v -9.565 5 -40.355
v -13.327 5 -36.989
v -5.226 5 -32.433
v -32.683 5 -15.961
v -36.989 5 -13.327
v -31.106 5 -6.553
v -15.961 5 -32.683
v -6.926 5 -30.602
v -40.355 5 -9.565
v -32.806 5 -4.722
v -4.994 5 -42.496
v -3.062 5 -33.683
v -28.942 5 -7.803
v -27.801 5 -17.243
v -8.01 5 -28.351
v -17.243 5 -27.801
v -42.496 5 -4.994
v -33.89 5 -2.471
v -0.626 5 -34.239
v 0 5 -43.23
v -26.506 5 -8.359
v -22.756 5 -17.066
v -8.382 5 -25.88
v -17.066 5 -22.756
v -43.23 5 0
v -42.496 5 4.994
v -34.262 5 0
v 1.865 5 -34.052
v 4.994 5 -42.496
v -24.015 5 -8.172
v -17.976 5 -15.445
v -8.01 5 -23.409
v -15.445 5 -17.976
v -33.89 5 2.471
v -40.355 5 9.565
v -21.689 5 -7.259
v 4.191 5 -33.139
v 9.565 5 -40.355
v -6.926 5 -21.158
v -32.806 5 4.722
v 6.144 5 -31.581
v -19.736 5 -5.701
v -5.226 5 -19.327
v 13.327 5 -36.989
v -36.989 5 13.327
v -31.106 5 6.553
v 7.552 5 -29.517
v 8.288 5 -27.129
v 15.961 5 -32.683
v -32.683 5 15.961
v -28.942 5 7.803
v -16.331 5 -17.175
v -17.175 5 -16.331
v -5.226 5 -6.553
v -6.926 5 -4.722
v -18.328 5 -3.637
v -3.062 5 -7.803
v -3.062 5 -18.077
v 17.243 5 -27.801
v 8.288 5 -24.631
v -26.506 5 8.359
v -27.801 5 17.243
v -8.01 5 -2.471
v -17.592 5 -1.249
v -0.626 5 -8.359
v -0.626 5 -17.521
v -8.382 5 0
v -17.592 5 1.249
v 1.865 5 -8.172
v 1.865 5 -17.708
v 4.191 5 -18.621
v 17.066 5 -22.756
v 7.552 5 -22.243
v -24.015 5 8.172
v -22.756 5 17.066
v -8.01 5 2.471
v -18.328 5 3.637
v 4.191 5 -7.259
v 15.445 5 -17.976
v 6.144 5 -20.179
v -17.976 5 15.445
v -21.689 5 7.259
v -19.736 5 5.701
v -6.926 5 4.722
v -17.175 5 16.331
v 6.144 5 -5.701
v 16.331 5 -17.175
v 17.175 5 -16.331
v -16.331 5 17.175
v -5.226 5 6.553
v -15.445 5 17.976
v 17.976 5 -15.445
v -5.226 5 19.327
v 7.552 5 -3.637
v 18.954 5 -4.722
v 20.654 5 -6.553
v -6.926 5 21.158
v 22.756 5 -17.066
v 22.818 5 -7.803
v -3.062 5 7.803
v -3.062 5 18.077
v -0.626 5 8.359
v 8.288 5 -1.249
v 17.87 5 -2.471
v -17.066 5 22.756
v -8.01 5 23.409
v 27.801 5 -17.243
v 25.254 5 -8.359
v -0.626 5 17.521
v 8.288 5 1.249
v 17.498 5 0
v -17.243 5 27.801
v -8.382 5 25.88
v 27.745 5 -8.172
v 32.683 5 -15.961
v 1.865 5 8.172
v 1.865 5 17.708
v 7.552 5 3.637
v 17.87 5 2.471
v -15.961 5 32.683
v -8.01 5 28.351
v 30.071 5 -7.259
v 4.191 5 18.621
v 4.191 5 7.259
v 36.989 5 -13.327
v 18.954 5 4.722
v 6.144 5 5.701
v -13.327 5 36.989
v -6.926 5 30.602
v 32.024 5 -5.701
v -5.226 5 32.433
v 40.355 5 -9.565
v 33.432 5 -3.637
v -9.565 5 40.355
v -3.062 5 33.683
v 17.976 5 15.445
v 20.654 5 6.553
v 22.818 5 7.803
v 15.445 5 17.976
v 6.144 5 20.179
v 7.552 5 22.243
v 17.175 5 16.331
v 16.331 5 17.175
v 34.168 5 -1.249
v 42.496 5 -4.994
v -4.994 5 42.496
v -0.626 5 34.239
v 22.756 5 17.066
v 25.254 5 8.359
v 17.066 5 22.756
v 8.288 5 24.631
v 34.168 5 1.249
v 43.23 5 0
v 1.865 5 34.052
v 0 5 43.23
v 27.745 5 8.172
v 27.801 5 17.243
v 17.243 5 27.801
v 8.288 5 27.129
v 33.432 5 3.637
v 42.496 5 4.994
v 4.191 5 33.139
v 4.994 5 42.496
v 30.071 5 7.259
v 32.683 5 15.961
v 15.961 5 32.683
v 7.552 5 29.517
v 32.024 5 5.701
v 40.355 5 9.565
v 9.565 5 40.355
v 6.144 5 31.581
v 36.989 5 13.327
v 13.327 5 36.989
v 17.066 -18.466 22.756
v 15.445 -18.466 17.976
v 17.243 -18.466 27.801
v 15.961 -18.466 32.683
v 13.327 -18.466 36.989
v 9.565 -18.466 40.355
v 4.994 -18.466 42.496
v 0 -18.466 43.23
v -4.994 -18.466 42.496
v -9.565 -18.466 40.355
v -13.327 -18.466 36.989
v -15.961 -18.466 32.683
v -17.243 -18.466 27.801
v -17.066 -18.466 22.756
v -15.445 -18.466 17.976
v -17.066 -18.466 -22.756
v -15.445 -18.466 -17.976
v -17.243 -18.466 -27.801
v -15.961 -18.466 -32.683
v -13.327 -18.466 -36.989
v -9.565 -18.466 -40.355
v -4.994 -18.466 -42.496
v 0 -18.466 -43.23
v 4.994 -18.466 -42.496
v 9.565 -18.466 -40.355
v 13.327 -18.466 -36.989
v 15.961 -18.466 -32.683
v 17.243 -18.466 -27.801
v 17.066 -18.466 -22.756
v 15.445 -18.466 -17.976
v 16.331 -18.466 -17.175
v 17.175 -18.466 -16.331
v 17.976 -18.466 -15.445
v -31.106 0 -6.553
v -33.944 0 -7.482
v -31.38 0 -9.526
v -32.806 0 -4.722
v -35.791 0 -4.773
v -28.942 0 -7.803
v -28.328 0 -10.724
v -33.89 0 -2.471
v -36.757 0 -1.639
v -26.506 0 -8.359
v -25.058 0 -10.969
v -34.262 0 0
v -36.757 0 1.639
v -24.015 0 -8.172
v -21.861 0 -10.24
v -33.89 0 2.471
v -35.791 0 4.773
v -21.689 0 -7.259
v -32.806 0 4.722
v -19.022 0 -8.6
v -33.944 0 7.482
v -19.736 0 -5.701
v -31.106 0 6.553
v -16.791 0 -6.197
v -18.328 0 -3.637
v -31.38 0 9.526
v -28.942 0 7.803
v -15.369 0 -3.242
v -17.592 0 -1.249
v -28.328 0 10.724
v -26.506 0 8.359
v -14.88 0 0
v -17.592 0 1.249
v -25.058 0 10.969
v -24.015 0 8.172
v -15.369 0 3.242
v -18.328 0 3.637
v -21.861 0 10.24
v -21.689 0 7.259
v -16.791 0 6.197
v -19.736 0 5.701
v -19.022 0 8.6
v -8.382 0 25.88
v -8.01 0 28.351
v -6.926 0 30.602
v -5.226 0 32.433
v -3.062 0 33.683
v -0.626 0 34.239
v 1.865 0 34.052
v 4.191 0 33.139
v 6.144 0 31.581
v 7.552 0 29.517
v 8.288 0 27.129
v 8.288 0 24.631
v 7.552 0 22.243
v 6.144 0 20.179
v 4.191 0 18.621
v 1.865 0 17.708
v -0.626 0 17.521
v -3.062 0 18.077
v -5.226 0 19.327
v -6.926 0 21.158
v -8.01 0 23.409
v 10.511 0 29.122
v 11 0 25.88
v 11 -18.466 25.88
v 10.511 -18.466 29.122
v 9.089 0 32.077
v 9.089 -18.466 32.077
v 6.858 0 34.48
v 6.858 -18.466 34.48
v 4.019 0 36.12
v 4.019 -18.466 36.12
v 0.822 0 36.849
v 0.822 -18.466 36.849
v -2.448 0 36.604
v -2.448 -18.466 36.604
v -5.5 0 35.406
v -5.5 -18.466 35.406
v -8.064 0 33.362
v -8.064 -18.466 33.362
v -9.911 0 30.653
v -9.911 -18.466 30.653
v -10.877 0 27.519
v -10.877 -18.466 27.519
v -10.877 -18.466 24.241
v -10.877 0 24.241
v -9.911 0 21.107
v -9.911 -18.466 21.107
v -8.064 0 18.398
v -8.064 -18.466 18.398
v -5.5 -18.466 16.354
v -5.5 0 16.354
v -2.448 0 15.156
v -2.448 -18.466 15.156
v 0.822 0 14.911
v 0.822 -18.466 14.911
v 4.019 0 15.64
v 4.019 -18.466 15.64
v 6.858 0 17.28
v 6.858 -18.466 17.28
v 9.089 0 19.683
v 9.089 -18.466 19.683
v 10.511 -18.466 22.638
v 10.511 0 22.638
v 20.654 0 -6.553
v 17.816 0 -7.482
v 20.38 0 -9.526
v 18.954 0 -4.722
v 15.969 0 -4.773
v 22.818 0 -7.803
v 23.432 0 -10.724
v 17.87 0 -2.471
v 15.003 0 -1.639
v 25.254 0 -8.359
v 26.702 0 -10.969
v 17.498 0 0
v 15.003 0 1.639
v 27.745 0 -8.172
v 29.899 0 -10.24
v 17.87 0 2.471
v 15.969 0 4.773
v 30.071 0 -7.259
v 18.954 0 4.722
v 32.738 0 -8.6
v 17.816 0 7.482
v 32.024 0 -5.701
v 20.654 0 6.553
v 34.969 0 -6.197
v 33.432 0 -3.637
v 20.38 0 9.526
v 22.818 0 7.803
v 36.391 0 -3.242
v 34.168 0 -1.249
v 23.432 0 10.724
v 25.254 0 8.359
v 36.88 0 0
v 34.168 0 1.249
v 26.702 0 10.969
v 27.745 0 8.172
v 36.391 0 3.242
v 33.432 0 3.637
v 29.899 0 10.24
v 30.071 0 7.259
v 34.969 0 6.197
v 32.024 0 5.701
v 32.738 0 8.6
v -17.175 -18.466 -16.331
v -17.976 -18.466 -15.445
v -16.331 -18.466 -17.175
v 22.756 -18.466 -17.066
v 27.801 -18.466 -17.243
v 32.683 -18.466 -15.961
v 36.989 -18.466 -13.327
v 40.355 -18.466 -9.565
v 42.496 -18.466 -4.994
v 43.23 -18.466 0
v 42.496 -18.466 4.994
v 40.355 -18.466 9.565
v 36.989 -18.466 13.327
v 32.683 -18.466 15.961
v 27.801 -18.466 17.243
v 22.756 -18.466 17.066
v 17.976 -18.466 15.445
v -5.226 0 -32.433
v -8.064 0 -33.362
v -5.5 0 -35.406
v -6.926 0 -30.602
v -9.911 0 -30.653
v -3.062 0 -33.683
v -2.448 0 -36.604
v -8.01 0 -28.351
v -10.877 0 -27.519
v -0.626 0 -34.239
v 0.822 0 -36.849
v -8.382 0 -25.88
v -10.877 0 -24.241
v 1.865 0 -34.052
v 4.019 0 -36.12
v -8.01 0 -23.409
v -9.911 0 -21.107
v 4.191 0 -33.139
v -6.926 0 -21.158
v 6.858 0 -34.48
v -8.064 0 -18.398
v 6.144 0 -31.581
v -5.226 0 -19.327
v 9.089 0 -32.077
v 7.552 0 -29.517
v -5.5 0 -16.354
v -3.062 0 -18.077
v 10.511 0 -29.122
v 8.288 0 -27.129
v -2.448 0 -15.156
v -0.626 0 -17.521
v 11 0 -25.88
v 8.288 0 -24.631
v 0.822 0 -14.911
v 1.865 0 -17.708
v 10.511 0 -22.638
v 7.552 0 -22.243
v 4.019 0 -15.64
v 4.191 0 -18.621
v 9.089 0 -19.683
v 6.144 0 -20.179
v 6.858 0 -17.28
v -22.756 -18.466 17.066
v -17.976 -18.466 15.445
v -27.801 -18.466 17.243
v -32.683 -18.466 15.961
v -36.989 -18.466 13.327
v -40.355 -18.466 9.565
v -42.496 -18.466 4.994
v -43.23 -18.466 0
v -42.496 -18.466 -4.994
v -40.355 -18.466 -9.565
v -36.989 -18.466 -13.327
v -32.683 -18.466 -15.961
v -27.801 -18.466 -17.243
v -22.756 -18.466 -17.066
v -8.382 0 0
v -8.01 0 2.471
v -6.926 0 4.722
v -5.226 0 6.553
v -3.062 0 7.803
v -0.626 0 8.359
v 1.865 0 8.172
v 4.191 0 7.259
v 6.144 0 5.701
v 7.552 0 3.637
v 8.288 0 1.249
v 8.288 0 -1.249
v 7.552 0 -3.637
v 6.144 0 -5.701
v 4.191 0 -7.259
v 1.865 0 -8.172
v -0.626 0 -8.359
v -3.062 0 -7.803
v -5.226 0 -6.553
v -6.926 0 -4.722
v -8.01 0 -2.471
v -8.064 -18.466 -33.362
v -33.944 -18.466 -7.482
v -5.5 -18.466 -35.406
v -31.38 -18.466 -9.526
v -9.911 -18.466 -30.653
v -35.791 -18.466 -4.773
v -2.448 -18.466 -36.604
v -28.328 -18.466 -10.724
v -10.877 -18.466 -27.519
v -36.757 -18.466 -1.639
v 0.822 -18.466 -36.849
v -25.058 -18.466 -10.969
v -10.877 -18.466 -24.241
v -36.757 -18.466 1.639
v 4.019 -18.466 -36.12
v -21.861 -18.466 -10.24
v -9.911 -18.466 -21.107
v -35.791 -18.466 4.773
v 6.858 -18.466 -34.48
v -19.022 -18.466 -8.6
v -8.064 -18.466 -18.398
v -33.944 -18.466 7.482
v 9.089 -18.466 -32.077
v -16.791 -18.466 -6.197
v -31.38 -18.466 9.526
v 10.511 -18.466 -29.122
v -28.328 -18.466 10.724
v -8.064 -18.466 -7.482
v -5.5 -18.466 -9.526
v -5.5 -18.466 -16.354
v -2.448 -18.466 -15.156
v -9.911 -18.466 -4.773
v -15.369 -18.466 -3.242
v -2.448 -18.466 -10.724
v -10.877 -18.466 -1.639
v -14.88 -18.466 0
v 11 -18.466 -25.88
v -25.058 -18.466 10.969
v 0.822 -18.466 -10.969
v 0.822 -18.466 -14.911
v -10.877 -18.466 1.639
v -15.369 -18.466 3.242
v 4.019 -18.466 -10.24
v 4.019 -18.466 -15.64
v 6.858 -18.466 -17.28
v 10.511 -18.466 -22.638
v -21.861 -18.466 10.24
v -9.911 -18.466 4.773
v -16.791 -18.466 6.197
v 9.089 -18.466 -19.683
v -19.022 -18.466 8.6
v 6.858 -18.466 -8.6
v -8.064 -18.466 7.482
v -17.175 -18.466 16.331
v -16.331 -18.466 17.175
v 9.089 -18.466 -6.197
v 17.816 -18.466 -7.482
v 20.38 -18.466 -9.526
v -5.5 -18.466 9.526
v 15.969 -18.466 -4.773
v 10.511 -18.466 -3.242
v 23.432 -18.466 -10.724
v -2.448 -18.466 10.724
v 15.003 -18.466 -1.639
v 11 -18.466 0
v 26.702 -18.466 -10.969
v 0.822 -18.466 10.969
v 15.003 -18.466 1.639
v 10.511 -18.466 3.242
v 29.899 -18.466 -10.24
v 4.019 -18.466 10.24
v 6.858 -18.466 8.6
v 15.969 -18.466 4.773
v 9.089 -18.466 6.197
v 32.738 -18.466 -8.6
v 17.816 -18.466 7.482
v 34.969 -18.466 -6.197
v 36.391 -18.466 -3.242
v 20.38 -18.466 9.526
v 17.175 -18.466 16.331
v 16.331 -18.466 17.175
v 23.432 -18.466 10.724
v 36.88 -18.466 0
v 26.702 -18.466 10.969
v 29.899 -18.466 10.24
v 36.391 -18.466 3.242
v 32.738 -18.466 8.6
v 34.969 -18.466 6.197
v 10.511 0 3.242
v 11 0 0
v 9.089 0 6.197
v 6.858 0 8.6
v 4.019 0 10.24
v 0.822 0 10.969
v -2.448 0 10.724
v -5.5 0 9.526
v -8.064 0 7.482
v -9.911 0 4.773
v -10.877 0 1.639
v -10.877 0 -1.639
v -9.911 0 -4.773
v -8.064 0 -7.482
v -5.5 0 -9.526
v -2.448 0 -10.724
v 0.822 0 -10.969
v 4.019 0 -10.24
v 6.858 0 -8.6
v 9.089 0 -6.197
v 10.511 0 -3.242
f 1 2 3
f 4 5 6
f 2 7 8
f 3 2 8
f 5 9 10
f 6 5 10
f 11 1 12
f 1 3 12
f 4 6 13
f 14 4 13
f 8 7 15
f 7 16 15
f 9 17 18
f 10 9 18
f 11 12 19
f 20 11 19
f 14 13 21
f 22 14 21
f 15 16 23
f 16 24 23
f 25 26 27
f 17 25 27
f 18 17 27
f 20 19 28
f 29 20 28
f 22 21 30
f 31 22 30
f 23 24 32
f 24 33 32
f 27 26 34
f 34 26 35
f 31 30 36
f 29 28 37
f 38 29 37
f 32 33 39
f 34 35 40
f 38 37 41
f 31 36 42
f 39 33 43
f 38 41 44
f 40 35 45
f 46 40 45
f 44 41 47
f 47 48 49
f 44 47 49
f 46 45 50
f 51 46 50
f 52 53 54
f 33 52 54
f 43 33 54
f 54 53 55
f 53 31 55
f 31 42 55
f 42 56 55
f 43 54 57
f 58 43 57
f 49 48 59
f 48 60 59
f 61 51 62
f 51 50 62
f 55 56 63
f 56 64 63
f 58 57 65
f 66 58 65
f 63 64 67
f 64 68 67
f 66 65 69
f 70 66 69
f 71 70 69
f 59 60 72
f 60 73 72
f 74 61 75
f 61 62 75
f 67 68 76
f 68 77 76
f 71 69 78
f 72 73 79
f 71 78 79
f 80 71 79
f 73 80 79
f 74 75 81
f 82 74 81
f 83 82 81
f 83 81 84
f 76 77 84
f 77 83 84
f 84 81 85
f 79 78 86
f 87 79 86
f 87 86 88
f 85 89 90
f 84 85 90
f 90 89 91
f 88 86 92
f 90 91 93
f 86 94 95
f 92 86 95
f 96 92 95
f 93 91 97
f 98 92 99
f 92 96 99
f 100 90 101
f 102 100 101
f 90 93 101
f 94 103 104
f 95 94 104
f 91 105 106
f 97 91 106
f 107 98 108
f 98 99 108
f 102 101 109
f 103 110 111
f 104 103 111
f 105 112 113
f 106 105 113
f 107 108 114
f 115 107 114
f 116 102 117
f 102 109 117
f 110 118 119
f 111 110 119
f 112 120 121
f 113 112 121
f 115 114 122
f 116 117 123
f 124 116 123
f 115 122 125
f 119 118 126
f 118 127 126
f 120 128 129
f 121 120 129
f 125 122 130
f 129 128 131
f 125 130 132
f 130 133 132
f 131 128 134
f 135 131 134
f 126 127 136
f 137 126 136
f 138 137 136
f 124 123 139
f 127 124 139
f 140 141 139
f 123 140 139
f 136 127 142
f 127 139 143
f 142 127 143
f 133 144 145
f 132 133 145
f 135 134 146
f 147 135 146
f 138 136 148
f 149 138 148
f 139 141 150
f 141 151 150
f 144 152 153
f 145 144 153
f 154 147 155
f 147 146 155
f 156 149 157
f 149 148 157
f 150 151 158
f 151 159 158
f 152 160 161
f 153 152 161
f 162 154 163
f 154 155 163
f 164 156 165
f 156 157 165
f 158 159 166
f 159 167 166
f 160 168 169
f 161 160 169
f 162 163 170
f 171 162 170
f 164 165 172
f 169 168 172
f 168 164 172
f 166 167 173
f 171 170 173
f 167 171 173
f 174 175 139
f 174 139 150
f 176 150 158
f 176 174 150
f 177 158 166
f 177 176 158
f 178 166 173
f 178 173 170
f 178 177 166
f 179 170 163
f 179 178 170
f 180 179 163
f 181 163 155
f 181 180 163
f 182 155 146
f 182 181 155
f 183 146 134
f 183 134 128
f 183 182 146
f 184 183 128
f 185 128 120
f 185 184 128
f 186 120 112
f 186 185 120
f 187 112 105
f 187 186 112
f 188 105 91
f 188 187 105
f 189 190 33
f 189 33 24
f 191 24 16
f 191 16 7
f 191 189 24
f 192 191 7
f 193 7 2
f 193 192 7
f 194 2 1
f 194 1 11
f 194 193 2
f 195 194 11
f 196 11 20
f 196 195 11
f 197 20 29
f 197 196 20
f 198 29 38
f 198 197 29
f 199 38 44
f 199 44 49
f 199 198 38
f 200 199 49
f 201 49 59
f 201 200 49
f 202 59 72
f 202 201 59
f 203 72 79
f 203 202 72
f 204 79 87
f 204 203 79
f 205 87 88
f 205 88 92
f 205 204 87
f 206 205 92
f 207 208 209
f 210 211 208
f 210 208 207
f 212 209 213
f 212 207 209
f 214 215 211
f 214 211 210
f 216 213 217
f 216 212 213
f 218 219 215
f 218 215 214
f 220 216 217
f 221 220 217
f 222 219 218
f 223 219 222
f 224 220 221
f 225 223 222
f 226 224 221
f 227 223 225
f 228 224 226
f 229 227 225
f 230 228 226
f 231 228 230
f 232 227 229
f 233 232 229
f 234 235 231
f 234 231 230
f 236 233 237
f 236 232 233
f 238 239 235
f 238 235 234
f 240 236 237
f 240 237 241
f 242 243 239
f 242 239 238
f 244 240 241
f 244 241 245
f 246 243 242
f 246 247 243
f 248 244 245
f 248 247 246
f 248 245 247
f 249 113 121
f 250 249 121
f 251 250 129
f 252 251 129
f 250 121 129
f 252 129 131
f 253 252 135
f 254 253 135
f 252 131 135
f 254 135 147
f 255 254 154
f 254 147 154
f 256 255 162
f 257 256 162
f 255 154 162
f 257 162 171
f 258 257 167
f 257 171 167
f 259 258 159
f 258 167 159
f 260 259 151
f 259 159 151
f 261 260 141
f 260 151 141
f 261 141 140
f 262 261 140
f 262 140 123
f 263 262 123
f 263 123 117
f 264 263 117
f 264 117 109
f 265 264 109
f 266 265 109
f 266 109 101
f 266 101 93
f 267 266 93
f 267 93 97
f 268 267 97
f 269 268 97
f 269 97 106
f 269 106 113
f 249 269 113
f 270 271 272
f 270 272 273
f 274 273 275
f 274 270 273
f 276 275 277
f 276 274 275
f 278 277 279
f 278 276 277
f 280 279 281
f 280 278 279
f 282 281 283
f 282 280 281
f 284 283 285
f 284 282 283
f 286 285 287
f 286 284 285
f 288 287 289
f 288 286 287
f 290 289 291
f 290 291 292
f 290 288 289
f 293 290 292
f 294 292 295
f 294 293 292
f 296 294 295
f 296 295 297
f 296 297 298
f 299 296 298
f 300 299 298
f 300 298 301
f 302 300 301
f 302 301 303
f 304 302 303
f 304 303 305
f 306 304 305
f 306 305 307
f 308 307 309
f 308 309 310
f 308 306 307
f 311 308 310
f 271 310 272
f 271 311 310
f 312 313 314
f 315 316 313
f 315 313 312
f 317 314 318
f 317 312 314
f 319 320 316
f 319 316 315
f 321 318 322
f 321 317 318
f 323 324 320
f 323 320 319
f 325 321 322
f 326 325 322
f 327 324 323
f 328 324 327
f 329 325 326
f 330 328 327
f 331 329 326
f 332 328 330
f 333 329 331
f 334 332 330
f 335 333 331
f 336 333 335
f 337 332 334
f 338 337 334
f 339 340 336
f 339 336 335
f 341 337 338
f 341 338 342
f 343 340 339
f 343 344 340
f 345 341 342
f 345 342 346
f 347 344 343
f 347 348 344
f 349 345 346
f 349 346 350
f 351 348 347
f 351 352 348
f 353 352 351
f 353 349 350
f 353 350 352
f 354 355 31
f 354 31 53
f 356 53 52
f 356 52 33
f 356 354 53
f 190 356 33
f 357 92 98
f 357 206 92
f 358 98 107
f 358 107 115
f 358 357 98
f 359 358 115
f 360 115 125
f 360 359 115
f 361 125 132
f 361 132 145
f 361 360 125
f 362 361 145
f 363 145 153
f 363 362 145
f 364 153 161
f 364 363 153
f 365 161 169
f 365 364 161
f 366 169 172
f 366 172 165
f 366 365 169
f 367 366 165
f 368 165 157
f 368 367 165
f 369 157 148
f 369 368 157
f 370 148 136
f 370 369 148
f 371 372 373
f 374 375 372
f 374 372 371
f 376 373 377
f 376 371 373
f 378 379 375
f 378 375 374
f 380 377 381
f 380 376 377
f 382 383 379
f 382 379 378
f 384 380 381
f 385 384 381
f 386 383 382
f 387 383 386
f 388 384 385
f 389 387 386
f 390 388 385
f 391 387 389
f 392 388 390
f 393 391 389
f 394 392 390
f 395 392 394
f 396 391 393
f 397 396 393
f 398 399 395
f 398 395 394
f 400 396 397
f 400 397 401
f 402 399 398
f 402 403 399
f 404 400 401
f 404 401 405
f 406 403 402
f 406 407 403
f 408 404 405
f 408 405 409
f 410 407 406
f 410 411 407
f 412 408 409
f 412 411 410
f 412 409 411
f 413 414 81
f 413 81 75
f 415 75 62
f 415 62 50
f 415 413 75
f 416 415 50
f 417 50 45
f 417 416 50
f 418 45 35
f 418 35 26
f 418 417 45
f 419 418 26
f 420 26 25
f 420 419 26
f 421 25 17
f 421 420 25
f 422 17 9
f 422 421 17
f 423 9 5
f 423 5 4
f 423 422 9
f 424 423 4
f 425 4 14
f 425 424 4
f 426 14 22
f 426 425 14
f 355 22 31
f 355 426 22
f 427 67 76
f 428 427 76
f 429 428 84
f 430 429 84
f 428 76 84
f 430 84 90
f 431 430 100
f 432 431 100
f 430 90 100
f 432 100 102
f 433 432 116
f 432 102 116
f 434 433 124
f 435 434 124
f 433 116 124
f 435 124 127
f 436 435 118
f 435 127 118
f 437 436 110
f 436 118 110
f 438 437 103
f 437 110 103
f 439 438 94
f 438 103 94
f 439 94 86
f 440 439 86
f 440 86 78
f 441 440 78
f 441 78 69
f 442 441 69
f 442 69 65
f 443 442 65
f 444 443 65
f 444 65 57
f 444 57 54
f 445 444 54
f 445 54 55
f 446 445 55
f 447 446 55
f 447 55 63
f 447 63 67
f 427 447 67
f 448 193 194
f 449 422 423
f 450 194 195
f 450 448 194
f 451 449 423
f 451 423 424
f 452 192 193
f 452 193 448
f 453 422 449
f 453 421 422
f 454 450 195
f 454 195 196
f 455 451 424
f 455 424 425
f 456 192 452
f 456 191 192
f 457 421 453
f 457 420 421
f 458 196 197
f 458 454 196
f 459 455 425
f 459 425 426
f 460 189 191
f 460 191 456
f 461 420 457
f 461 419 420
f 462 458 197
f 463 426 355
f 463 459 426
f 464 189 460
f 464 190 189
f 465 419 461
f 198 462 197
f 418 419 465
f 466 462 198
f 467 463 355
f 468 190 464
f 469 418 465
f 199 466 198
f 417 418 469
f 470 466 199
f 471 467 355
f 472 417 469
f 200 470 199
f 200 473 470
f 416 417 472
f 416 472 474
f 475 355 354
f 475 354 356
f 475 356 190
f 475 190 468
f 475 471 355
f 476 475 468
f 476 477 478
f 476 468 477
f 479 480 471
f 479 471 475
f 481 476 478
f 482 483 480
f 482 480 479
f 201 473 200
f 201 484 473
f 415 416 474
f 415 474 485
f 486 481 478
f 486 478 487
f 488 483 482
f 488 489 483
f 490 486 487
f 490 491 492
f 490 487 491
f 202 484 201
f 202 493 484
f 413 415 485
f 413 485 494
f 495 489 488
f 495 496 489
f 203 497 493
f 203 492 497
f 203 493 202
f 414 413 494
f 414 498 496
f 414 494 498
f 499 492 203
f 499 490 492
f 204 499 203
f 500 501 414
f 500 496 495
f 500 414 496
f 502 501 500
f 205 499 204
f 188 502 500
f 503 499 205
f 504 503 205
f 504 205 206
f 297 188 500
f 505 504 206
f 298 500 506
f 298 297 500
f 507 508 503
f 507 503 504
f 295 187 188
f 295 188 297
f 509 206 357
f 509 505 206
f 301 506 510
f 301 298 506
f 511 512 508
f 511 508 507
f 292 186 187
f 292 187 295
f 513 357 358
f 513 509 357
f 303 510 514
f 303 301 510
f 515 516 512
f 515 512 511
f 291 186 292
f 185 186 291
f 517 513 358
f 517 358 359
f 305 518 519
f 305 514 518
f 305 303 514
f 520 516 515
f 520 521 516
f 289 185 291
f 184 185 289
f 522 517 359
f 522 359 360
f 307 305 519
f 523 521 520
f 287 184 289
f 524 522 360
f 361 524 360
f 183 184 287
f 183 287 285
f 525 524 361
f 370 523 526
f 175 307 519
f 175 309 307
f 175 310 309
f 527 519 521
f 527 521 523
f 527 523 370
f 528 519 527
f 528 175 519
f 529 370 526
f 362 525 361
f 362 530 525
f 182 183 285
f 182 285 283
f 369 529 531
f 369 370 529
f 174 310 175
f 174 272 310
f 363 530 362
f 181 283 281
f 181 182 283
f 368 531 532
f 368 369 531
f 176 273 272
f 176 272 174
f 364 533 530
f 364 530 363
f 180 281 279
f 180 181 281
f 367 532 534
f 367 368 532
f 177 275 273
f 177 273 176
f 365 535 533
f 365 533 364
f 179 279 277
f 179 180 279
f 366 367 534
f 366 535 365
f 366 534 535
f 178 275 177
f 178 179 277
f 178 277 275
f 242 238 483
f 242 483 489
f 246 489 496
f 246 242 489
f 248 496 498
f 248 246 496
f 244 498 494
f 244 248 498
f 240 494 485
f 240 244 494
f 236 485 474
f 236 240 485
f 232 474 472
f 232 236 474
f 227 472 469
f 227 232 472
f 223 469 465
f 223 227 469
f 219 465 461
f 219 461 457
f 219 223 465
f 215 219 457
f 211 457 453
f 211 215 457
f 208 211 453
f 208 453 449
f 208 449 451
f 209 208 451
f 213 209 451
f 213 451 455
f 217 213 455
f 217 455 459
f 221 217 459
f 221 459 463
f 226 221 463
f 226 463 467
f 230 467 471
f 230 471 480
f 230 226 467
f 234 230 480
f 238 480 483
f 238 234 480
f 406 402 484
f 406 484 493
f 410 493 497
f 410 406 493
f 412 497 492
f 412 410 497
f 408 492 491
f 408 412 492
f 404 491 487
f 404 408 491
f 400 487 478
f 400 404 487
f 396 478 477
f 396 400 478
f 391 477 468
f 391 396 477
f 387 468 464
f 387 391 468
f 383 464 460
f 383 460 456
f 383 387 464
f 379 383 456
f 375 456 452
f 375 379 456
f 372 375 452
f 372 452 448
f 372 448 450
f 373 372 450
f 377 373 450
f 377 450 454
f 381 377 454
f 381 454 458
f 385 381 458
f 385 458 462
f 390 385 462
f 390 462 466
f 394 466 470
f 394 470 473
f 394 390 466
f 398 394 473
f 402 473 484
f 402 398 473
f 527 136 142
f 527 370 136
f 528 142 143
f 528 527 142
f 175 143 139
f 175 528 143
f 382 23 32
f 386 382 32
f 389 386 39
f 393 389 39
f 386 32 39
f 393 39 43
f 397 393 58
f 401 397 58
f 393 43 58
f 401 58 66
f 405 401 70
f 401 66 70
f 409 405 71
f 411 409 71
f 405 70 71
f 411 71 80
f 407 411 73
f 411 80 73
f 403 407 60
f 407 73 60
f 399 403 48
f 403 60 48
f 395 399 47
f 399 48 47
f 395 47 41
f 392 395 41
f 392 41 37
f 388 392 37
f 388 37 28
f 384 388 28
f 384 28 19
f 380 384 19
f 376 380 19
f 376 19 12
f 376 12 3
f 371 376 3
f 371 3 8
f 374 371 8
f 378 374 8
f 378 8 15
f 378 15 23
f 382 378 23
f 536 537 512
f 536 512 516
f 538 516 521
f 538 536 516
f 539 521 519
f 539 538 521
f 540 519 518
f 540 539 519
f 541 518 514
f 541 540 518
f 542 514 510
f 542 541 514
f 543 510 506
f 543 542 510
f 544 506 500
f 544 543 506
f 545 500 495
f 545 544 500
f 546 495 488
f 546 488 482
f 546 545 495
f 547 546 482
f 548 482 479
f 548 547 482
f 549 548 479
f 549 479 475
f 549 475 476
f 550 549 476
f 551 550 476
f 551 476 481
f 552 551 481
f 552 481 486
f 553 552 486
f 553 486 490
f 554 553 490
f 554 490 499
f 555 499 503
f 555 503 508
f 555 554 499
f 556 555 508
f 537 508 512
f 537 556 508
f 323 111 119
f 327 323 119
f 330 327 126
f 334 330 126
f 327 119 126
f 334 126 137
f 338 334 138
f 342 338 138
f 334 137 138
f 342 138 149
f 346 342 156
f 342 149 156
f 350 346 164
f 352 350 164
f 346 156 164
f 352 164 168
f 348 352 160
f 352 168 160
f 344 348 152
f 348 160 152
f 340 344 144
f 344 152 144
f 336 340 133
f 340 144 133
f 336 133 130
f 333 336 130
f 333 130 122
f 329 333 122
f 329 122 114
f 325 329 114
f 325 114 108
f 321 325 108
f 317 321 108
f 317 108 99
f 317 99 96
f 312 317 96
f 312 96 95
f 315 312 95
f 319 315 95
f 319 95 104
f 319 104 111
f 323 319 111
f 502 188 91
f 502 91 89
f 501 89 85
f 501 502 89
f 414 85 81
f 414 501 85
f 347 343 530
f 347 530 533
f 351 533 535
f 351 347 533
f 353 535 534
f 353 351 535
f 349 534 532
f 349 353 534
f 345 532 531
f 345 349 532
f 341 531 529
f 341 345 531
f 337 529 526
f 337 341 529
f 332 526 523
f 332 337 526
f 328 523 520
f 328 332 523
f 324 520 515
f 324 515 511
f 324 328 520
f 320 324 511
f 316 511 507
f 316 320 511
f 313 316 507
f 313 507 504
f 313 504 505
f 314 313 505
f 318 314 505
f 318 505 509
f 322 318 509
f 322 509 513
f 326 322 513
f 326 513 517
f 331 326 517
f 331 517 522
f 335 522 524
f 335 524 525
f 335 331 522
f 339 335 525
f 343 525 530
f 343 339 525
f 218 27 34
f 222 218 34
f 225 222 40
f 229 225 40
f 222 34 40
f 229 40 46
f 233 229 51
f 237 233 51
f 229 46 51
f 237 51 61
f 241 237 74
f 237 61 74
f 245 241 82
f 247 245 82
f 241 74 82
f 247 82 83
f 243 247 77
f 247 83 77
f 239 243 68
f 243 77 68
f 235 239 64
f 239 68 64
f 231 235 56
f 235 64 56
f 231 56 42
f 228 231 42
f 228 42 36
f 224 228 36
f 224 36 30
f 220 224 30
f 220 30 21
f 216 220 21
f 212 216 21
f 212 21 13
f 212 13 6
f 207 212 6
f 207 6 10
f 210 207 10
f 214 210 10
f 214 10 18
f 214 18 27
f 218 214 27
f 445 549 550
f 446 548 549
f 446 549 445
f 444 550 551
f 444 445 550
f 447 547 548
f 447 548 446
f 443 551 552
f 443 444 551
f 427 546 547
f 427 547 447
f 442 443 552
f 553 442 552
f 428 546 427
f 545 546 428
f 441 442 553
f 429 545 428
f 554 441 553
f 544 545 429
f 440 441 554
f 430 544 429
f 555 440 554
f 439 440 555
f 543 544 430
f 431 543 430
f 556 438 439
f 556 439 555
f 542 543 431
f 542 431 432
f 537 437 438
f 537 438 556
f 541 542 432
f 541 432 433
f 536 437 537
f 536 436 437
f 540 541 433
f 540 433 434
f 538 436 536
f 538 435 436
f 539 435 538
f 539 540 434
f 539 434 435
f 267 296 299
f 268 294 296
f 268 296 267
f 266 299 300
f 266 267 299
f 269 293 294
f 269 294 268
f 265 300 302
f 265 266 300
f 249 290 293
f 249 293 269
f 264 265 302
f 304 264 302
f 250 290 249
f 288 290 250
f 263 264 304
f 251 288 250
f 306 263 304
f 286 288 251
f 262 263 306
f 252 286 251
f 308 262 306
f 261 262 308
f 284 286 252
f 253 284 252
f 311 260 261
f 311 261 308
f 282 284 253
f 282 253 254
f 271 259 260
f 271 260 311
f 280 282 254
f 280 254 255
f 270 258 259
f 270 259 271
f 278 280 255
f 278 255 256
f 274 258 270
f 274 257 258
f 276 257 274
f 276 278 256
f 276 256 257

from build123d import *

# Parameters (mm, degrees)
F0_R     = 11
F1_DEPTH = 18.4658
F2_DEPTH = 5
F3_R     = 8.382
F4_DEPTH = 25.4


# Not quite as in the source:
# - a feature of the source that left no trace in its solid (it failed there, or was rolled back) is left out


with BuildPart() as f1:
    # F0 (on Front) → F1 (new body)
    with BuildSketch(Plane.XZ):
        with BuildLine():
            ThreePointArc((17.9760799845, 15.4450816893), (16.7584308008, 16.7584306274), (15.4450818753, 17.9760798247))
            ThreePointArc((15.4450818753, 17.9760798247), (0, 43.2300002384), (-15.4450818753, 17.9760798247))
            ThreePointArc((-15.4450818753, 17.9760798247), (-16.7584308008, 16.7584306274), (-17.9760799845, 15.4450816893))
            ThreePointArc((-17.9760799845, 15.4450816893), (-43.23, 0), (-17.9760799845, -15.4450816893))
            ThreePointArc((-17.9760799845, -15.4450816893), (-16.7584307141, -16.7584307141), (-15.4450816893, -17.9760799845))
            ThreePointArc((-15.4450816893, -17.9760799845), (0, -43.23), (15.4450816893, -17.9760799845))
            ThreePointArc((15.4450816893, -17.9760799845), (16.7584307141, -16.7584307141), (17.9760799845, -15.4450816893))
            ThreePointArc((17.9760799845, -15.4450816893), (43.23, 0), (17.9760799845, 15.4450816893))
        make_face()
        with Locations((-25.88, 0)):
            Circle(F0_R, mode=Mode.SUBTRACT)
        with Locations((0, -25.88)):
            Circle(F0_R, mode=Mode.SUBTRACT)
        Circle(F0_R, mode=Mode.SUBTRACT)
        with Locations((25.88, 0)):
            Circle(F0_R, mode=Mode.SUBTRACT)
        with Locations((0, 25.88)):
            Circle(F0_R, mode=Mode.SUBTRACT)
    extrude(amount=F1_DEPTH)

    # F0 (on Front) → F2 (join)
    with BuildSketch(Plane.XZ):
        with BuildLine():
            ThreePointArc((17.9760799845, 15.4450816893), (16.7584308008, 16.7584306274), (15.4450818753, 17.9760798247))
            ThreePointArc((15.4450818753, 17.9760798247), (0, 43.2300002384), (-15.4450818753, 17.9760798247))
            ThreePointArc((-15.4450818753, 17.9760798247), (-16.7584308008, 16.7584306274), (-17.9760799845, 15.4450816893))
            ThreePointArc((-17.9760799845, 15.4450816893), (-43.23, 0), (-17.9760799845, -15.4450816893))
            ThreePointArc((-17.9760799845, -15.4450816893), (-16.7584307141, -16.7584307141), (-15.4450816893, -17.9760799845))
            ThreePointArc((-15.4450816893, -17.9760799845), (0, -43.23), (15.4450816893, -17.9760799845))
            ThreePointArc((15.4450816893, -17.9760799845), (16.7584307141, -16.7584307141), (17.9760799845, -15.4450816893))
            ThreePointArc((17.9760799845, -15.4450816893), (43.23, 0), (17.9760799845, 15.4450816893))
        make_face()
        with Locations((-25.88, 0)):
            Circle(F0_R, mode=Mode.SUBTRACT)
        with Locations((0, -25.88)):
            Circle(F0_R, mode=Mode.SUBTRACT)
        Circle(F0_R, mode=Mode.SUBTRACT)
        with Locations((25.88, 0)):
            Circle(F0_R, mode=Mode.SUBTRACT)
        with Locations((0, 25.88)):
            Circle(F0_R, mode=Mode.SUBTRACT)
        with Locations((0, 25.88)):
            Circle(F0_R)
        with Locations((25.88, 0)):
            Circle(F0_R)
        Circle(F0_R)
        with Locations((-25.88, 0)):
            Circle(F0_R)
        with Locations((0, -25.88)):
            Circle(F0_R)
    extrude(amount=-F2_DEPTH)

    # F3 (on face) → F4 (cut)
    with BuildSketch(Plane(origin=(0, 5, 0), x_dir=(-1, 0, 0), z_dir=(0, 1, 0))):
        with Locations((0, 25.88)):
            Circle(F3_R)
        with Locations((-25.88, 0)):
            Circle(F3_R)
        Circle(F3_R)
        with Locations((0, -25.88)):
            Circle(F3_R)
        with Locations((25.88, 0)):
            Circle(F3_R)
    extrude(amount=-F4_DEPTH, mode=Mode.SUBTRACT)


solid = f1.part
